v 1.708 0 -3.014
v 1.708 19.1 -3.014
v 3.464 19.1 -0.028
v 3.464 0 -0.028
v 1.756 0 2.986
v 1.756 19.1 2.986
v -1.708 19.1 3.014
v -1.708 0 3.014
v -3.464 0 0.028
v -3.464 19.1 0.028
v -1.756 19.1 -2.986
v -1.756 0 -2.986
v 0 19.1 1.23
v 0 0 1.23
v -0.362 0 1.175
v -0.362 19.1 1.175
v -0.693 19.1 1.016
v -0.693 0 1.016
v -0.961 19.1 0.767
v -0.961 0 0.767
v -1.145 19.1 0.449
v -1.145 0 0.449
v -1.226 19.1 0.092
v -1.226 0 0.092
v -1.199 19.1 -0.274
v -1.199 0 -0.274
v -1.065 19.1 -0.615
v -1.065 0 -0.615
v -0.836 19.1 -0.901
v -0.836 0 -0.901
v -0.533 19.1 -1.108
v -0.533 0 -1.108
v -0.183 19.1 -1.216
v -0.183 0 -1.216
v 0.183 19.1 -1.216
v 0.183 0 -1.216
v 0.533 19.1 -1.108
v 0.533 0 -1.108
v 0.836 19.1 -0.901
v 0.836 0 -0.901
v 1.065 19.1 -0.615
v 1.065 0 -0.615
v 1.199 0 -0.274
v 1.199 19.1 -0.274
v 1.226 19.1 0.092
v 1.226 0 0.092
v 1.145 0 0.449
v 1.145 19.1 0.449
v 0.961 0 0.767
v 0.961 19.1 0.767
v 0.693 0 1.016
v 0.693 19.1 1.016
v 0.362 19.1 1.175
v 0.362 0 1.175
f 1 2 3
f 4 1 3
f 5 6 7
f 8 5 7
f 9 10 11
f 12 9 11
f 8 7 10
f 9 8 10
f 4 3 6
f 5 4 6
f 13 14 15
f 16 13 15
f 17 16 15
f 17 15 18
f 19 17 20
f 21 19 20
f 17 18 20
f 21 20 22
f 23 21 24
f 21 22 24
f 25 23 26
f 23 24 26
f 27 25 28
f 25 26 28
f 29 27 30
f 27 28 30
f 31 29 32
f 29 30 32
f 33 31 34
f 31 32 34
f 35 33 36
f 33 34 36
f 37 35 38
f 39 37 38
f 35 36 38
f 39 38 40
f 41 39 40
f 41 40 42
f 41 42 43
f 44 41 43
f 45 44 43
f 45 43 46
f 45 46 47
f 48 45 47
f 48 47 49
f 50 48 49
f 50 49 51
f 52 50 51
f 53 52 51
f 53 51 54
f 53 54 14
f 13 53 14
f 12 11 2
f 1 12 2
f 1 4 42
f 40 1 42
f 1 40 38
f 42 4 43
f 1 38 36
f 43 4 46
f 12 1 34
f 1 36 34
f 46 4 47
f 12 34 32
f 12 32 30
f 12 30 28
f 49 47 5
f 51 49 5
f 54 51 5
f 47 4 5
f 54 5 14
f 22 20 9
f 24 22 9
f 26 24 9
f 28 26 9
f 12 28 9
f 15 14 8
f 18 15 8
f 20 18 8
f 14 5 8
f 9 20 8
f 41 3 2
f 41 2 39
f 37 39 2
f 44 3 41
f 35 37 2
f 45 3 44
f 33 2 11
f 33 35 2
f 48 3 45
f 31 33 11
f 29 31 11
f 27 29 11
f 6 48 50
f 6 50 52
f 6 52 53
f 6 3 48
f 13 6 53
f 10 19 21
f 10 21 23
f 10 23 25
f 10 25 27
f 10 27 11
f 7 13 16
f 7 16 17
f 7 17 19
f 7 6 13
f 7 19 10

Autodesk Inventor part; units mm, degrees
ref_plane "YZ Plane" through (0, 0, 0) normal (1, 0, 0) x (0, 1, 0)
ref_plane "XZ Plane" through (0, 0, 0) normal (0, 1, 0) x (-1, 0, 0)
ref_plane "XY Plane" through (0, 0, 0) normal (0, 0, 1) x (1, 0, 0)
sketch "Boceto1" plane through (0, 0, 0) normal (0, 1, 0) x (-1, 0, 0)
  line L0 (1.7076, 3.014) -> (3.464, 0.0282)
  line L1 (3.464, 0.0282) -> (1.7564, -2.9858)
  line L2 (1.7564, -2.9858) -> (-1.7076, -3.014)
  line L3 (-1.7076, -3.014) -> (-3.464, -0.0282)
  line L4 (-3.464, -0.0282) -> (-1.7564, 2.9858)
  line L5 (-1.7564, 2.9858) -> (1.7076, 3.014)
  point P0 (0, 0)
  point P1 (0, 0)
  dimension "d0" = 6
extrude "Extrusión1" add sketch "Boceto1" along normal blind 19.1
sketch "Boceto2" plane through (0, 19.1, 0) normal (0, 1, 0) x (1, 0, 0)
  point P0 (0, 0)
  point P1 (0, 0)
hole "Agujero1" at (0, 19.1, 0) direction (0, -1, 0) diameter 2.459 end through all thread size "M3x0.5" class "6H" standard "ISO Metric profile"
properties part number "pataUnion" material "Poliestireno"
